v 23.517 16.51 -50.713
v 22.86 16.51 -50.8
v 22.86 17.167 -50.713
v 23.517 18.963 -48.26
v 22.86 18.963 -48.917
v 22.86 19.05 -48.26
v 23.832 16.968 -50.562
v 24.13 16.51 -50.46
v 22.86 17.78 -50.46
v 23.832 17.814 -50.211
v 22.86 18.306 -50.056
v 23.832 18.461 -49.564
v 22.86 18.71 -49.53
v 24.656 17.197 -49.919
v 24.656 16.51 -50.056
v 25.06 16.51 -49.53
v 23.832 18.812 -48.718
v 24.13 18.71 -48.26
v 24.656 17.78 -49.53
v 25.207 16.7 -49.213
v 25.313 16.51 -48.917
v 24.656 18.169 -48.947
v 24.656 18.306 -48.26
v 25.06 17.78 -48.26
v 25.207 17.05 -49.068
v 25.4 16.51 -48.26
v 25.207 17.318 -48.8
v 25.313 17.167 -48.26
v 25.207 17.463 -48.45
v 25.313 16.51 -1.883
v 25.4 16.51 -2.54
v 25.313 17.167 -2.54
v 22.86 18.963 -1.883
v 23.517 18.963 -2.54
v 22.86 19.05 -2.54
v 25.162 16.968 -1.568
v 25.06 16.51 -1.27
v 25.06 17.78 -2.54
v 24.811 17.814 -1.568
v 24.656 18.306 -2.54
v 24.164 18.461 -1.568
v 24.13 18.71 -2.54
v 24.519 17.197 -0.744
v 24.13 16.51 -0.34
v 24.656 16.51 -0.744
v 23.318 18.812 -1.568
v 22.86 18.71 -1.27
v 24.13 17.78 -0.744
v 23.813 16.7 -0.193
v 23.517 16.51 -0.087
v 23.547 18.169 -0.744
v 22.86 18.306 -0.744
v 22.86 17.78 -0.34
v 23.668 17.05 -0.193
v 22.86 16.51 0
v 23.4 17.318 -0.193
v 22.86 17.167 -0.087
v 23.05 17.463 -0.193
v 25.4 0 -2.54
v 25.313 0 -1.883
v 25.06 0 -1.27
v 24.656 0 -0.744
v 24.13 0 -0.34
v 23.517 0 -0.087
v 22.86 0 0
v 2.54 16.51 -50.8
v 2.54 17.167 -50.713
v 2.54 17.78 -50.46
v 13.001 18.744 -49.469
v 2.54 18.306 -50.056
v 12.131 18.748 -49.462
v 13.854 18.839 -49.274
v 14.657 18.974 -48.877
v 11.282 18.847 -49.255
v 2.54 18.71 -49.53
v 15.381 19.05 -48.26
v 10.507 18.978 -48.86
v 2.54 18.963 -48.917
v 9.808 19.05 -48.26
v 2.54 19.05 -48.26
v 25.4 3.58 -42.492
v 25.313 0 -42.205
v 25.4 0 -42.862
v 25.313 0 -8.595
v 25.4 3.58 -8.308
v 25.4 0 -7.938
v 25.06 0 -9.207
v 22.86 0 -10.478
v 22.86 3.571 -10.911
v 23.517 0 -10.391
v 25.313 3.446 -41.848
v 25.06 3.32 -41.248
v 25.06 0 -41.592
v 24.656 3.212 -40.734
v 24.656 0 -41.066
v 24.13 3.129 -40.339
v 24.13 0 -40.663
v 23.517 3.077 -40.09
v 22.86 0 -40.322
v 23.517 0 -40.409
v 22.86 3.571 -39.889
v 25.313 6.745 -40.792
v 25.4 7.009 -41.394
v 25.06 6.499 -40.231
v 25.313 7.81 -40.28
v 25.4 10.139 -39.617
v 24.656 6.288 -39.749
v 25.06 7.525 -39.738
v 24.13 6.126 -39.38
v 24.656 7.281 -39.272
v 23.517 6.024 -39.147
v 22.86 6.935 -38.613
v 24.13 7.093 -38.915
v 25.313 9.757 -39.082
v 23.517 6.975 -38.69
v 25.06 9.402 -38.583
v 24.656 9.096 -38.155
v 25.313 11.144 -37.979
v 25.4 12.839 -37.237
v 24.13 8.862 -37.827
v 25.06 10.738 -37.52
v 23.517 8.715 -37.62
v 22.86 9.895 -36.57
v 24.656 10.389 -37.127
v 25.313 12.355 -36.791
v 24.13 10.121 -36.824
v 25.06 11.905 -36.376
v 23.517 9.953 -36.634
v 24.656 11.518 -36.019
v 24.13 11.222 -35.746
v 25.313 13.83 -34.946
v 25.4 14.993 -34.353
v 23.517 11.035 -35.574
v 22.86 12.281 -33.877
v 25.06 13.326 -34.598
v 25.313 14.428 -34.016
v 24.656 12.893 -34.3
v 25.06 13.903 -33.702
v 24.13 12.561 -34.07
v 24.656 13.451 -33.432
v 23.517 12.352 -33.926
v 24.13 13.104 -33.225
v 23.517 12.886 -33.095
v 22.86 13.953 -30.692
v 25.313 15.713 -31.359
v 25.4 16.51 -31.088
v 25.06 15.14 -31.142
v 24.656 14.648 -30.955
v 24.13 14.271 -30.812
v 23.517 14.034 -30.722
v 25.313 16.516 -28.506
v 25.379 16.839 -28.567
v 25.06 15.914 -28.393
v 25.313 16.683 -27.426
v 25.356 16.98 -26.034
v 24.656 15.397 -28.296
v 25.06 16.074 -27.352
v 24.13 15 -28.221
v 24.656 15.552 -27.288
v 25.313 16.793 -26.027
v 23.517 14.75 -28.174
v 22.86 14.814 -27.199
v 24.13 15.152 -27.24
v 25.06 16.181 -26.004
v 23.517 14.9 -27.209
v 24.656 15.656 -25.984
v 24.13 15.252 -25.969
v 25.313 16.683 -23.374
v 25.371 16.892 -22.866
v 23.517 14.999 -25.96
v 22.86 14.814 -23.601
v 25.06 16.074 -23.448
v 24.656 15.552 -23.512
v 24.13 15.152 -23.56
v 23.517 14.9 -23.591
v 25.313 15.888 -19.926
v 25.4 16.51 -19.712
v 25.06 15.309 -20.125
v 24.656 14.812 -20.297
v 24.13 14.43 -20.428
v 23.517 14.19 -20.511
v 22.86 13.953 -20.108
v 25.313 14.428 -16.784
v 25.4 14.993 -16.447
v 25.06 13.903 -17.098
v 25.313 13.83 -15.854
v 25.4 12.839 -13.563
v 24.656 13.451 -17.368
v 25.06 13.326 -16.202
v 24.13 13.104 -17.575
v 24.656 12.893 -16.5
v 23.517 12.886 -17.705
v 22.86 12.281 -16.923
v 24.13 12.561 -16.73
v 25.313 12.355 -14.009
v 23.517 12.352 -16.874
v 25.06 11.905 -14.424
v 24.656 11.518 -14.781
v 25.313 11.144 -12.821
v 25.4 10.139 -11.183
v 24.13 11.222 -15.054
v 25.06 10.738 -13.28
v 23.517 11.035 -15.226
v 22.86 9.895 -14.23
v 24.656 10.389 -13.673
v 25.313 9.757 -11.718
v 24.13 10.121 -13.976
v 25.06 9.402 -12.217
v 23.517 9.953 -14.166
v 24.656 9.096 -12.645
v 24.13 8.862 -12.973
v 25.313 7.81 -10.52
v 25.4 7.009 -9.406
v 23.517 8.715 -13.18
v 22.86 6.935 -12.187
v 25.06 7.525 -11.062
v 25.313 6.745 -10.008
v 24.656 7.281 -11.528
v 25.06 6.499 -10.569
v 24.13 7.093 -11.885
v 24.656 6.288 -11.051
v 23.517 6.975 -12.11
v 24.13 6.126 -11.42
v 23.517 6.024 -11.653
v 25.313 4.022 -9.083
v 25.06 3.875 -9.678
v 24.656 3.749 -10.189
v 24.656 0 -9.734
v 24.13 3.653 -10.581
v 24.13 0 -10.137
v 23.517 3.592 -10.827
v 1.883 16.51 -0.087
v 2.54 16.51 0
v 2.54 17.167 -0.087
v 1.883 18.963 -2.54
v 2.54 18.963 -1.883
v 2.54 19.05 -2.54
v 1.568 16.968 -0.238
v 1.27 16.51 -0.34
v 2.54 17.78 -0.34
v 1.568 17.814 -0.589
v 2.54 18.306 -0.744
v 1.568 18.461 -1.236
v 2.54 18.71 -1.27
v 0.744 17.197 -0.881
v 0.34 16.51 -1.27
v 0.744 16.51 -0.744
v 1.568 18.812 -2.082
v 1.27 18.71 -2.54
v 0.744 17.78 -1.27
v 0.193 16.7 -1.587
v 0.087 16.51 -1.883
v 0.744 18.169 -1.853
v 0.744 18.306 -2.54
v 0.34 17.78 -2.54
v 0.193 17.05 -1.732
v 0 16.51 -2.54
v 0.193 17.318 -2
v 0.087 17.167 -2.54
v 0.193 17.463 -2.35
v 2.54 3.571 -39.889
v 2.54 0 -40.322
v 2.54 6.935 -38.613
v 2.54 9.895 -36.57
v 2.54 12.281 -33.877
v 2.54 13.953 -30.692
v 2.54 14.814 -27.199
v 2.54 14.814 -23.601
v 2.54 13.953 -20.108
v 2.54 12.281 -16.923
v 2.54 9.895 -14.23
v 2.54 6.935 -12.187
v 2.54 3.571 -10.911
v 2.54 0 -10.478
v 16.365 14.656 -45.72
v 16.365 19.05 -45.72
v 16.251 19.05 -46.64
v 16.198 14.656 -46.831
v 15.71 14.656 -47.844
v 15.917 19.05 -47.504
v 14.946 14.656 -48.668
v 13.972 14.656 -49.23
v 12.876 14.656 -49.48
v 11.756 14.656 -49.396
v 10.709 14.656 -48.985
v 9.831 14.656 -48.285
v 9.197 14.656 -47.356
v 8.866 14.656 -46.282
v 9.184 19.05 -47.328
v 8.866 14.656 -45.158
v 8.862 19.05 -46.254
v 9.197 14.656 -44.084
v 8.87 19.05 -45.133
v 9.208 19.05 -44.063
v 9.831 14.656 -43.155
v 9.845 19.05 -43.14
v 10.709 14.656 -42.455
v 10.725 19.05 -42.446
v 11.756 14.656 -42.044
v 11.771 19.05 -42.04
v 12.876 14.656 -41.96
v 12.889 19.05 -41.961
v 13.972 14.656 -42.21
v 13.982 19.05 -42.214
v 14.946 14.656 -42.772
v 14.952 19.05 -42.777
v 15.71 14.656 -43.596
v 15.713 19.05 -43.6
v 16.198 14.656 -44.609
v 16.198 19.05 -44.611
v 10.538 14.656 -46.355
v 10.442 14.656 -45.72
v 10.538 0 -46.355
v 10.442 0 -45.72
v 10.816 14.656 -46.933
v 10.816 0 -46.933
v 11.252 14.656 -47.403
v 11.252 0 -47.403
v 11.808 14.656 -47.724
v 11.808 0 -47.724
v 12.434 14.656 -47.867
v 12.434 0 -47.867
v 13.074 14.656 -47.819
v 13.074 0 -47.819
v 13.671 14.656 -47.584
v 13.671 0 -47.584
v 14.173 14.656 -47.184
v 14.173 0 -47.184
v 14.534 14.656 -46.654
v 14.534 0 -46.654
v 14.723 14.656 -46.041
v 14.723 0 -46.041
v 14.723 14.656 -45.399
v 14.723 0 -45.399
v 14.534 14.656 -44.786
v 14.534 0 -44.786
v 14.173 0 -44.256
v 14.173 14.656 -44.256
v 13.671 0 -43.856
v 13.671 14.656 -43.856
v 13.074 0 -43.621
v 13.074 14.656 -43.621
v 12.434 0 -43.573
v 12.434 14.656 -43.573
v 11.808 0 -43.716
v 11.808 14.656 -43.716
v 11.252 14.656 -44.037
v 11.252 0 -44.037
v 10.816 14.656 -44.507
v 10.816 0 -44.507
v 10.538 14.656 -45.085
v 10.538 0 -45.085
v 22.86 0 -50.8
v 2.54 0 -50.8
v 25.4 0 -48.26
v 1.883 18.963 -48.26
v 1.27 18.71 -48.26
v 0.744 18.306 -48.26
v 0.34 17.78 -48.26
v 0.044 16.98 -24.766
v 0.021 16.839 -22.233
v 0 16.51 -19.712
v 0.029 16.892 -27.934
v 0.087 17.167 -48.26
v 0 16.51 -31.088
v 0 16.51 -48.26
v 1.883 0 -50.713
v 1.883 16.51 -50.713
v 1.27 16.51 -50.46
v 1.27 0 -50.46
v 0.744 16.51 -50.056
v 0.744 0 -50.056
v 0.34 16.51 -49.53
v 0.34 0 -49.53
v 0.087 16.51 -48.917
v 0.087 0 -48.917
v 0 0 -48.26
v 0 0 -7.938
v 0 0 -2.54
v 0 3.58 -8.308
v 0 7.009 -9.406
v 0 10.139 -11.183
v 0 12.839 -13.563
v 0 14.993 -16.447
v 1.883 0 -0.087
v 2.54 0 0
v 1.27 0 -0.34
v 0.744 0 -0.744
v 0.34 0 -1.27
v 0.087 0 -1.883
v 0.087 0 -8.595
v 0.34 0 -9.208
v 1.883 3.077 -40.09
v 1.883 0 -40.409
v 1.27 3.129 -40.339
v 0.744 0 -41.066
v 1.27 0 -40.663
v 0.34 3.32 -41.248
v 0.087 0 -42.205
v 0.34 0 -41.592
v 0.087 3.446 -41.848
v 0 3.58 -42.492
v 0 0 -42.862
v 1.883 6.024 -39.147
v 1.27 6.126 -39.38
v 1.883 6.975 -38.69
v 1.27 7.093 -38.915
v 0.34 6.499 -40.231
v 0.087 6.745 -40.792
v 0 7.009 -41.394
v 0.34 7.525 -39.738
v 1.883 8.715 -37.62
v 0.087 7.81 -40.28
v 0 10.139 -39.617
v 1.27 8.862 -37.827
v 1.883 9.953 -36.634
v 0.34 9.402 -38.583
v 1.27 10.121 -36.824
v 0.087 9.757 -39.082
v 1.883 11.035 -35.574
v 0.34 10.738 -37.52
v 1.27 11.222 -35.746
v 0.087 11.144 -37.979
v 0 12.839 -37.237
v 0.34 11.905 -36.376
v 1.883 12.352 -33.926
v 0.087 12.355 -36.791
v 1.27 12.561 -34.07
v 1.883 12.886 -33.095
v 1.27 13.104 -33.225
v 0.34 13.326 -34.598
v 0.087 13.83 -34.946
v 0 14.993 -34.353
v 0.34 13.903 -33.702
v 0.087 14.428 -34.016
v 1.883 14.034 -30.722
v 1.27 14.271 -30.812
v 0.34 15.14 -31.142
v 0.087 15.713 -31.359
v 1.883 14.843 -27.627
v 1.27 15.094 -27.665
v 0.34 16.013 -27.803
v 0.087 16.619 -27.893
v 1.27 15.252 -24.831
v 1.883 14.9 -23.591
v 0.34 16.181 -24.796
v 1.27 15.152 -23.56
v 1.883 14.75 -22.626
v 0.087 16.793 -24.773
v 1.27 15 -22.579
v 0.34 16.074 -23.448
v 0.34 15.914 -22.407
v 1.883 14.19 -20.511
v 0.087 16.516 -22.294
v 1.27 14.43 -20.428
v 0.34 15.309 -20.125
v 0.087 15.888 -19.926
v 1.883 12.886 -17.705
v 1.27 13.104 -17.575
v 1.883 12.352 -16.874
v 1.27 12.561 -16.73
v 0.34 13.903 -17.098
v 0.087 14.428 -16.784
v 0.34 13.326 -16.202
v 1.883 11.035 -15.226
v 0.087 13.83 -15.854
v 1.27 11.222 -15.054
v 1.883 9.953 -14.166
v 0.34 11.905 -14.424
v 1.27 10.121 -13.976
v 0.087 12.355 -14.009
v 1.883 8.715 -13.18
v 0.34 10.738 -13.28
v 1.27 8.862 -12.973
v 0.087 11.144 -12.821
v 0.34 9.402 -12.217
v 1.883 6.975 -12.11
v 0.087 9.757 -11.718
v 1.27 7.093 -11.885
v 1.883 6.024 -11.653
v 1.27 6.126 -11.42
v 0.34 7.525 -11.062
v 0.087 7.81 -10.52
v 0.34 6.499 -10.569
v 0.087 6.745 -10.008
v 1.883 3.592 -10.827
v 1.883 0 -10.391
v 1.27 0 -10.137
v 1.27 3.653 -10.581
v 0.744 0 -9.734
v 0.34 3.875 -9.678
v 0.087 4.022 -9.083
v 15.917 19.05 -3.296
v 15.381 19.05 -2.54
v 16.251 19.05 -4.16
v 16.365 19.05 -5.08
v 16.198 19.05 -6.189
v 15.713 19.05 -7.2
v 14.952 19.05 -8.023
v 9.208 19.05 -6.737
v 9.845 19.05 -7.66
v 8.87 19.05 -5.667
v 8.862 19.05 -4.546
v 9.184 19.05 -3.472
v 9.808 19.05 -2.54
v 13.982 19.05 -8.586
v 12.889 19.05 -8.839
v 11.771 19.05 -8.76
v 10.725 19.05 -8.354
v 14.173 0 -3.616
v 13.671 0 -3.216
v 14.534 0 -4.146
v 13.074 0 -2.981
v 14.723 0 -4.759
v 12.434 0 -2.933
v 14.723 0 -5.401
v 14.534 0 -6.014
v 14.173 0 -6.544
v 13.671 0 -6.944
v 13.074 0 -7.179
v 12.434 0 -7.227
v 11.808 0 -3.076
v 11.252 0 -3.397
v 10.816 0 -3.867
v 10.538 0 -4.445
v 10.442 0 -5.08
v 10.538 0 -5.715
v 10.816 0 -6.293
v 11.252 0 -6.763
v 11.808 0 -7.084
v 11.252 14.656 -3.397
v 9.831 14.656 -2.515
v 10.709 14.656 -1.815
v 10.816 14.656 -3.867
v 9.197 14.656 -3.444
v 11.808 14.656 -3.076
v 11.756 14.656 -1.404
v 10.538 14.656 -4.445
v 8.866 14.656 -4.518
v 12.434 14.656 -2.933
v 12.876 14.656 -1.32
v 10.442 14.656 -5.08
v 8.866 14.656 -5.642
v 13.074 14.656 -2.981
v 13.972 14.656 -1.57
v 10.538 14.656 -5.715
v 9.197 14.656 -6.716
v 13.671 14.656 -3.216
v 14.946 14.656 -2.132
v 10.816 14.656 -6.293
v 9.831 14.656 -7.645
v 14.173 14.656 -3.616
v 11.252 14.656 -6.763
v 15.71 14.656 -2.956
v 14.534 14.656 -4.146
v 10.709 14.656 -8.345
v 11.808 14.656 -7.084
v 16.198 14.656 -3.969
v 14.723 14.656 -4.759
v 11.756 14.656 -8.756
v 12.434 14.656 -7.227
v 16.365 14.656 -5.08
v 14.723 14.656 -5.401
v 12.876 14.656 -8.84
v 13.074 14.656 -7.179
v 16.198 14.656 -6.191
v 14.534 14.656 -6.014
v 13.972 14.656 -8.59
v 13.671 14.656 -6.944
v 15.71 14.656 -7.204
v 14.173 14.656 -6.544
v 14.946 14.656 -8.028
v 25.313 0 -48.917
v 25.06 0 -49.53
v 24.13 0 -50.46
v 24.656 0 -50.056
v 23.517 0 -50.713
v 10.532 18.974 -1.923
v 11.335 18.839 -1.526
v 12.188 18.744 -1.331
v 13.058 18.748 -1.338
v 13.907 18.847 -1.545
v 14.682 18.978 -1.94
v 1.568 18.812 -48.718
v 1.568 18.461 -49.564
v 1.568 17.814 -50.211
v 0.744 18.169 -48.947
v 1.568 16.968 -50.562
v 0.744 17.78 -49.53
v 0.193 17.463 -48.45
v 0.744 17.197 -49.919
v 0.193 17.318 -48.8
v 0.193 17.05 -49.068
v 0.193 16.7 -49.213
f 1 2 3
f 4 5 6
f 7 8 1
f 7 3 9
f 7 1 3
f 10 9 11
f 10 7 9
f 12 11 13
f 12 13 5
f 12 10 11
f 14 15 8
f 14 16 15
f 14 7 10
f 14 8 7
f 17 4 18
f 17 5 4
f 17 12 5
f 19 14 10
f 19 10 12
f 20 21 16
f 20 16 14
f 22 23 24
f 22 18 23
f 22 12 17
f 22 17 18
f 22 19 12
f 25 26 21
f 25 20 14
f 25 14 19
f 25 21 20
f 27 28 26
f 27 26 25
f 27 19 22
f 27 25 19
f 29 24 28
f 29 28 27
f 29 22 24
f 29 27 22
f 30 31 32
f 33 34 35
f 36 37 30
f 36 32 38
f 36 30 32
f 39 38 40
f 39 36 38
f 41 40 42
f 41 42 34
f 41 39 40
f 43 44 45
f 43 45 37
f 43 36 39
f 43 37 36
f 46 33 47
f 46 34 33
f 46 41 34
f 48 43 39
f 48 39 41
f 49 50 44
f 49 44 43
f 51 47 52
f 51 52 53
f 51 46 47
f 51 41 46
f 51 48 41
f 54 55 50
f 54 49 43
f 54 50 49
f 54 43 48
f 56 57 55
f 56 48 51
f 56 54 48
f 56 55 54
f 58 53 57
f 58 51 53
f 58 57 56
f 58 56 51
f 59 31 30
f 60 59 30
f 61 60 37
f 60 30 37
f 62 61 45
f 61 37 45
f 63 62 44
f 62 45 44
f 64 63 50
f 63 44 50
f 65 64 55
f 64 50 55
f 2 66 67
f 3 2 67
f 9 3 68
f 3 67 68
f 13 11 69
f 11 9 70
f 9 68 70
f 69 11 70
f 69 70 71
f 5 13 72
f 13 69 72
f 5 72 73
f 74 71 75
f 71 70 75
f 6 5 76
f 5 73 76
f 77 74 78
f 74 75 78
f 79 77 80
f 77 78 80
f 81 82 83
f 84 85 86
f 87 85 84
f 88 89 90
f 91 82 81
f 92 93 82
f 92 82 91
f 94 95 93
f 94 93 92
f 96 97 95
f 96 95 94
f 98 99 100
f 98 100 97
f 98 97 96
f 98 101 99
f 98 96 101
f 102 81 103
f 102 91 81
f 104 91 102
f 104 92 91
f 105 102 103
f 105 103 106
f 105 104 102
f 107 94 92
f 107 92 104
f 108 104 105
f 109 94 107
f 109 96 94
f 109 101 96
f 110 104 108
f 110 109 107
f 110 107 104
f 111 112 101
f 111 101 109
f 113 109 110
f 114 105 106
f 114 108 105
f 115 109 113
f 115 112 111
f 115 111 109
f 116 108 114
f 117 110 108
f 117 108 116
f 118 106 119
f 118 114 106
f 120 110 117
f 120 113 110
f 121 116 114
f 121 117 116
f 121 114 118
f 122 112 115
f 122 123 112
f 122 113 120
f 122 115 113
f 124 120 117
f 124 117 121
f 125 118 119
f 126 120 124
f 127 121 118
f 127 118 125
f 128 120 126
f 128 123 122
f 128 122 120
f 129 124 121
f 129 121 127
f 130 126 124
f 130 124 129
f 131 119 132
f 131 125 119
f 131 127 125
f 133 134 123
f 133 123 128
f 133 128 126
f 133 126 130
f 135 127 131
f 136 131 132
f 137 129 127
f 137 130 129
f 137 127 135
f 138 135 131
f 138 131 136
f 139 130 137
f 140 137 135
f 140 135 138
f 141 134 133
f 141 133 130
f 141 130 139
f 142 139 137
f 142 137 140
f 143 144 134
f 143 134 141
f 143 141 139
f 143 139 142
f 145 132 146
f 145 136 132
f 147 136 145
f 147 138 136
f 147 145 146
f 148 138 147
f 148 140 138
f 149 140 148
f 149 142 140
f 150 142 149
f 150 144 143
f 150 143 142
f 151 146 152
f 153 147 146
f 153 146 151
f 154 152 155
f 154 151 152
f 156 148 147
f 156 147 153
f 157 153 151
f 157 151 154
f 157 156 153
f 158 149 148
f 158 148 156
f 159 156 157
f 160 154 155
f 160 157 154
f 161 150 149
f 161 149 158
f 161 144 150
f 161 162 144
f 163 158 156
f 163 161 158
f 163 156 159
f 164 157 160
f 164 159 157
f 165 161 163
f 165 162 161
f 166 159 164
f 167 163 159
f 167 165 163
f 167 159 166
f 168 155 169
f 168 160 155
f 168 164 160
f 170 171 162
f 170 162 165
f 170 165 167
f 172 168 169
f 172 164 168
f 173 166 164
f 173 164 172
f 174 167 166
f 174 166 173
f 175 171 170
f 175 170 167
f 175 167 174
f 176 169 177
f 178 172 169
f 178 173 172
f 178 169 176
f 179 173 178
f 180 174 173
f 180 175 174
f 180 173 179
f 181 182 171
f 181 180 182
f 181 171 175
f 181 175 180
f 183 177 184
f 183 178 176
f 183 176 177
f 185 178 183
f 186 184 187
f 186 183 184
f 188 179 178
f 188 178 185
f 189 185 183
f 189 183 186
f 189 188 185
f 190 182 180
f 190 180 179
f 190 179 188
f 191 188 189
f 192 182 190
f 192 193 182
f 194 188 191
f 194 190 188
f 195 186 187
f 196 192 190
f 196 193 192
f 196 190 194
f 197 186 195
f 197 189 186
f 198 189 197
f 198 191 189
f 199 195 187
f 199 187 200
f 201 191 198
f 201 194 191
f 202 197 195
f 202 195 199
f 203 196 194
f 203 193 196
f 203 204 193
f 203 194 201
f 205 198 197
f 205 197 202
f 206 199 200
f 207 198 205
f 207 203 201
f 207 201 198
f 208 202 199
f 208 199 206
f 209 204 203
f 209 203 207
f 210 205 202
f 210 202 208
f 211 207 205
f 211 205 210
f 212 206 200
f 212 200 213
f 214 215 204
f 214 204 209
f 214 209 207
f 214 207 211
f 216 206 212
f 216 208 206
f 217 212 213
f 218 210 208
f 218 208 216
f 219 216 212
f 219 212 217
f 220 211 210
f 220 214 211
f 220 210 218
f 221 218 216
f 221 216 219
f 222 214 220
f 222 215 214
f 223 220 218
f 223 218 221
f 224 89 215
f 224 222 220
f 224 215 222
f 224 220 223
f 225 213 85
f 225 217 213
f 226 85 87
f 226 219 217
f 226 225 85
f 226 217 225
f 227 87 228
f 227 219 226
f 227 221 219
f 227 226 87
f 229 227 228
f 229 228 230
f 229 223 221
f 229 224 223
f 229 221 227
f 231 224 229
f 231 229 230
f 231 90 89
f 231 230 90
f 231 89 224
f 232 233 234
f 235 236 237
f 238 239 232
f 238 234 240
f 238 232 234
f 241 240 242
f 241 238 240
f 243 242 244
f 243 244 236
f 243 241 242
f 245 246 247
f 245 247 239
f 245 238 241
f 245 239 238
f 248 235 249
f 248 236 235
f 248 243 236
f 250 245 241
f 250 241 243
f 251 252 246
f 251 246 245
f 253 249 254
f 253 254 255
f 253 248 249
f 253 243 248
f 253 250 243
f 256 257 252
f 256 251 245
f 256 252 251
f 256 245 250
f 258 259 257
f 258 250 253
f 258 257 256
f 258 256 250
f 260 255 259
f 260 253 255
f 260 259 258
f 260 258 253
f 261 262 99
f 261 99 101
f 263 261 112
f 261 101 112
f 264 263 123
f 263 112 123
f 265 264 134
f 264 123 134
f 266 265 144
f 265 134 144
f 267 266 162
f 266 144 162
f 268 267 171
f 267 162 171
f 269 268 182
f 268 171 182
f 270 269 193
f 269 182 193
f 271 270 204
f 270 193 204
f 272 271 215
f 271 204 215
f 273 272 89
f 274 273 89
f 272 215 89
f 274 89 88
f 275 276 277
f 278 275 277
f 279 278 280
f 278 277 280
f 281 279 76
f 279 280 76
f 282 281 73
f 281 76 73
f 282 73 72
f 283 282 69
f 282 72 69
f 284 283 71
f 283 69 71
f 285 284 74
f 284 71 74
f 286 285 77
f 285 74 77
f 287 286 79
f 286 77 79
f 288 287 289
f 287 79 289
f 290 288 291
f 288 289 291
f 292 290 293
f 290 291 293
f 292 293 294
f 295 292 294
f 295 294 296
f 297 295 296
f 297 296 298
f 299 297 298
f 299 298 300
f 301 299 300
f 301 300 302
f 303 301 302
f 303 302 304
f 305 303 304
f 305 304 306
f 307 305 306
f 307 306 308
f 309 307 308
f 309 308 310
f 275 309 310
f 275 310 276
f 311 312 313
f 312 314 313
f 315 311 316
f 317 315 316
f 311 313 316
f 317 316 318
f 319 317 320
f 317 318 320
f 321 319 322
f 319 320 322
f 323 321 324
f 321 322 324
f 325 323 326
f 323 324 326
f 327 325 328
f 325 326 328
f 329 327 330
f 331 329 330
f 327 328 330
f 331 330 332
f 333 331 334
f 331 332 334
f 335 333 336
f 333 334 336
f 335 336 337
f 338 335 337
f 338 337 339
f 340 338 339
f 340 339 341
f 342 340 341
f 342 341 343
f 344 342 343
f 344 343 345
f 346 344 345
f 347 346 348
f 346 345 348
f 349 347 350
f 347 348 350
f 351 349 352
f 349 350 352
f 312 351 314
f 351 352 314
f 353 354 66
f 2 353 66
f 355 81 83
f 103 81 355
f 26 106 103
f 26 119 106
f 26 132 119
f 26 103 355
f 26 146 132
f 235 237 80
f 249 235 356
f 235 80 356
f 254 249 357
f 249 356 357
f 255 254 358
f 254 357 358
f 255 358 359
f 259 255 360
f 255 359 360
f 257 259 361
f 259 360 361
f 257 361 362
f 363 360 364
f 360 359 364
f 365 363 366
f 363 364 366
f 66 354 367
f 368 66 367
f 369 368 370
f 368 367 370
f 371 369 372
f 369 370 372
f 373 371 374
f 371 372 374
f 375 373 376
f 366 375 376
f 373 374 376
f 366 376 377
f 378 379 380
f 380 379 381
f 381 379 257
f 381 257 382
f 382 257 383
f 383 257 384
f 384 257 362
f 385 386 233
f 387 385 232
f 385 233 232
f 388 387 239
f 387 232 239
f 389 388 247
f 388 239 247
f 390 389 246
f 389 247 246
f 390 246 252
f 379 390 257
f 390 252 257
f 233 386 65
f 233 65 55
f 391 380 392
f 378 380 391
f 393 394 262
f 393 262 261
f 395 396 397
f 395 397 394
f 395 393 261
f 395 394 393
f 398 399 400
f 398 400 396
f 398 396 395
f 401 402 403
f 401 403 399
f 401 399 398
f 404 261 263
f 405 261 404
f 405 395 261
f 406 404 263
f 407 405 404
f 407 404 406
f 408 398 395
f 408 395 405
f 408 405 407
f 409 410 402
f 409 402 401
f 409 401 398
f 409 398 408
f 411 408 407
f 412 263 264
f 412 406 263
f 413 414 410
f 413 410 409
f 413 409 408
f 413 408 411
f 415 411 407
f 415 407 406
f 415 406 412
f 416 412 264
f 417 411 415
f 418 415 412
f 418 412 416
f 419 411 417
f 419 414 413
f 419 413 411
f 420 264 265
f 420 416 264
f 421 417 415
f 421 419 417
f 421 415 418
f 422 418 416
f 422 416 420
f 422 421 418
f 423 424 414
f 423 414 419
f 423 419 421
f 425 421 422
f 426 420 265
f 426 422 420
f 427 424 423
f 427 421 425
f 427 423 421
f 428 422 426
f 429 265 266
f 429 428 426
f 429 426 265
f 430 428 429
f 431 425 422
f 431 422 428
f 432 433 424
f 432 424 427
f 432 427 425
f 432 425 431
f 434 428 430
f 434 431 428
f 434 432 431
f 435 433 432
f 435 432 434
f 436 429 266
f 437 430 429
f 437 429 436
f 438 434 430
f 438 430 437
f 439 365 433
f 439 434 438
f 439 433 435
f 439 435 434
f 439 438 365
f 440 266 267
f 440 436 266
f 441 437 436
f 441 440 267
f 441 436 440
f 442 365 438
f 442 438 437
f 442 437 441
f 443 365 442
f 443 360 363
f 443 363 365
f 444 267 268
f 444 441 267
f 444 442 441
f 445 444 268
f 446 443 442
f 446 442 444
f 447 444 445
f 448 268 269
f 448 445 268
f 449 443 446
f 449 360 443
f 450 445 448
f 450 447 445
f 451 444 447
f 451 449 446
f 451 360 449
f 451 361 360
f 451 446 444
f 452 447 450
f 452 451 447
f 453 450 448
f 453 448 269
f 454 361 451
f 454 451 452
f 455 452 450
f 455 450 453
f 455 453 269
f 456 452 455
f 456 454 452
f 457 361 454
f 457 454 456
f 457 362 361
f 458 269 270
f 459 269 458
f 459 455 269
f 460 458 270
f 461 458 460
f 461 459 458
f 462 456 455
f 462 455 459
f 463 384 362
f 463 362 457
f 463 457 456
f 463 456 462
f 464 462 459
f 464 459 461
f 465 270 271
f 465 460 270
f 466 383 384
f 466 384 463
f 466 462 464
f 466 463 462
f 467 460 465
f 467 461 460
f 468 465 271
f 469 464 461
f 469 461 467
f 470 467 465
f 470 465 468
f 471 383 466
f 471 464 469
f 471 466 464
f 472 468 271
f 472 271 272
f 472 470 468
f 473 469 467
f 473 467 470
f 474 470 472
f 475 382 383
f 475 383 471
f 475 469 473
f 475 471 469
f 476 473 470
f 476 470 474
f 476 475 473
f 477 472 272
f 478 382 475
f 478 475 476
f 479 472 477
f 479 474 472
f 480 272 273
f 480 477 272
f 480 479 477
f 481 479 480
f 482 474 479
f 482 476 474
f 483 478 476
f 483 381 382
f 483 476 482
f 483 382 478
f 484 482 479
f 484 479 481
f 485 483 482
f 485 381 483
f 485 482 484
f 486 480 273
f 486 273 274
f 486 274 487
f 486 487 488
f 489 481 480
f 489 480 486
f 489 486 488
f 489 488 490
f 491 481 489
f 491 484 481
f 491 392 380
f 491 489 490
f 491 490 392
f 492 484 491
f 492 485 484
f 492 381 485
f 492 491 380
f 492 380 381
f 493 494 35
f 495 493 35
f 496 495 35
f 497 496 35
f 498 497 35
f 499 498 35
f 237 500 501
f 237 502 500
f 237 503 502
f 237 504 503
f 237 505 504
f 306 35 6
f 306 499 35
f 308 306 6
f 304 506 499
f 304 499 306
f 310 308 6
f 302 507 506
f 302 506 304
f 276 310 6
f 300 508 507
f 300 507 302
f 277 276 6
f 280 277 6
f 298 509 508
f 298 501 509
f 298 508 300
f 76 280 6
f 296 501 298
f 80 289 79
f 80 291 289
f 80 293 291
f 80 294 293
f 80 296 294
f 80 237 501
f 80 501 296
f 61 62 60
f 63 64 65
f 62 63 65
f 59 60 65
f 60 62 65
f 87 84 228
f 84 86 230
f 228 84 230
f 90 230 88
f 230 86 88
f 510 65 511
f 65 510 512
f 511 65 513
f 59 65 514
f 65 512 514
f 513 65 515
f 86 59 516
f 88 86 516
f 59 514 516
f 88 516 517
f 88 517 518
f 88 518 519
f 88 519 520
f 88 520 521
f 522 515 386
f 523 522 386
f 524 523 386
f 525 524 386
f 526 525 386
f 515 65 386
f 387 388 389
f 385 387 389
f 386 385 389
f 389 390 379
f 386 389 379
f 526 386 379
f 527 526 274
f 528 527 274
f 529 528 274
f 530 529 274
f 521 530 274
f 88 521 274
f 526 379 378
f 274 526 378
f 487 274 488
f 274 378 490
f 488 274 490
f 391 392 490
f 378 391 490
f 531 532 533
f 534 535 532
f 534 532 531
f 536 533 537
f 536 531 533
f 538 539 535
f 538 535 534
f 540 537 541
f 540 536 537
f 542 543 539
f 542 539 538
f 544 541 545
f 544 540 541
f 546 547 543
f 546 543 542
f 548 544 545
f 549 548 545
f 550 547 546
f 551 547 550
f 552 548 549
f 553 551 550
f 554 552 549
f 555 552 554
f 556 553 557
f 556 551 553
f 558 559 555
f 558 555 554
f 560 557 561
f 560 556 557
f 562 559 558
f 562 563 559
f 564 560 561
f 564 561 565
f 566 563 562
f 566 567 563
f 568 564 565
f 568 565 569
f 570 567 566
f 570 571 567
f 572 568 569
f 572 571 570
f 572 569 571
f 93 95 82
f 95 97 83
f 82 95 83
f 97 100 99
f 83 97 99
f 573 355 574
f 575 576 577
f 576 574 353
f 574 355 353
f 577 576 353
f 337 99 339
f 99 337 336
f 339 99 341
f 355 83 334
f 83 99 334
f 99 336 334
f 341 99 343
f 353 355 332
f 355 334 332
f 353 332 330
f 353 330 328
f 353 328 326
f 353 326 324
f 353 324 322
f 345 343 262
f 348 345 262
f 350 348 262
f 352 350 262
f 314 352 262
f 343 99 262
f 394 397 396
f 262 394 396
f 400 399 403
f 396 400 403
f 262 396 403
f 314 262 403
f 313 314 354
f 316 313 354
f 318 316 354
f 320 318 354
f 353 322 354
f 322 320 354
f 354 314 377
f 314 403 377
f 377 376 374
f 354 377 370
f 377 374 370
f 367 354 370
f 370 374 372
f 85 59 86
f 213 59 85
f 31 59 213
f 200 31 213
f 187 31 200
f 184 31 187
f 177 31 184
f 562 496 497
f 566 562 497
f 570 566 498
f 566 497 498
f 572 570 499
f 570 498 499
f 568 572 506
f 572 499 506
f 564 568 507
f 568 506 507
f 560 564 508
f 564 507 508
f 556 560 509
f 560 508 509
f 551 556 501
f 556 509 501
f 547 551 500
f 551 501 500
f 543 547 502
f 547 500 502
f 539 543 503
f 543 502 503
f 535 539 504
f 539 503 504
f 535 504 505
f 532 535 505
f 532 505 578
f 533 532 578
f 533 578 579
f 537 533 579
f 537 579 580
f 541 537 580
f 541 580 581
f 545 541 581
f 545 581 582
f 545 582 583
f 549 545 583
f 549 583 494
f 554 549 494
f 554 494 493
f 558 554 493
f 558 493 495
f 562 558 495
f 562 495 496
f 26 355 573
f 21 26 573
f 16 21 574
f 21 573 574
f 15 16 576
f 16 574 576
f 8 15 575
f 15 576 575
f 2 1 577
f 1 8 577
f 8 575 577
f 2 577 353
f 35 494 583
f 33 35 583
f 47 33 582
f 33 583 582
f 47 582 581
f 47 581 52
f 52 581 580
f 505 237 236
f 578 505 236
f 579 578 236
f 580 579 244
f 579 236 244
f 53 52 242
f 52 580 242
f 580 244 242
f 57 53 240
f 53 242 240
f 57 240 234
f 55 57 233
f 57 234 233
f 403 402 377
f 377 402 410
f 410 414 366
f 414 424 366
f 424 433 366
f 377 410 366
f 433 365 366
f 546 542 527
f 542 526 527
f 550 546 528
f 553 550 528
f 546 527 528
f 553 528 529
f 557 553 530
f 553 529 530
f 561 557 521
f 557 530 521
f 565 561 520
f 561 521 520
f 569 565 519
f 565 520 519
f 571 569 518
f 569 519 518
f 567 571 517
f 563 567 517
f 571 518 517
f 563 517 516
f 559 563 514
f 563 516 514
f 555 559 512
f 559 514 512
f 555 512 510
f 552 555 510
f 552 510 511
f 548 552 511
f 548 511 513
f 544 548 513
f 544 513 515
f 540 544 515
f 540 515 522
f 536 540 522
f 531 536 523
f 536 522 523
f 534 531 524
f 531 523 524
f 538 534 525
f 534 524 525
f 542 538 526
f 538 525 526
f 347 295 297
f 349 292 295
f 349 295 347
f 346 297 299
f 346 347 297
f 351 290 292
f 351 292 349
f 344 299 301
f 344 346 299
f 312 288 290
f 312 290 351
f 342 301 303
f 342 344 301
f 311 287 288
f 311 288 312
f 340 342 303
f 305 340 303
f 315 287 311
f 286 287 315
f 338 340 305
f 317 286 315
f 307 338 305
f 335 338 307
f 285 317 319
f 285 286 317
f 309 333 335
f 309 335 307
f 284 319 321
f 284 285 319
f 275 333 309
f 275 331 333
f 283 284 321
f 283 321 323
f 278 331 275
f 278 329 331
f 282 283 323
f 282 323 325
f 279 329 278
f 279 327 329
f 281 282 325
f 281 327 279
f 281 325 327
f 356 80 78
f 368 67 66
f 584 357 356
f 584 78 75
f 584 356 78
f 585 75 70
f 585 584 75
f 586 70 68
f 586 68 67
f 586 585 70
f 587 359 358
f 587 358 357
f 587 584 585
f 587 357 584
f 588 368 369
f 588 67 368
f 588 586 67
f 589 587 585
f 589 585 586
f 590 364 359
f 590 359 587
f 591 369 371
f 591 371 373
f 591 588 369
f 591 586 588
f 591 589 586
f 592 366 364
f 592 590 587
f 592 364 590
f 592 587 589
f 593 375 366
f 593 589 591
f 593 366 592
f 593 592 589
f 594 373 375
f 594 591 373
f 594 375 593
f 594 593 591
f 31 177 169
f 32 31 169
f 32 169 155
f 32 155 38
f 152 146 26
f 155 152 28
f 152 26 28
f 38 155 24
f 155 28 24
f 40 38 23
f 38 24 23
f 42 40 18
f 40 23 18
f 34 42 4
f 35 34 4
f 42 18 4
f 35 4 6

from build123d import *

# Parameters (mm, degrees)
SKETCH1_W                                      = 50.8
SKETCH1_H                                      = 19.05
BOSS_EXTRUDE1_DEPTH                            = 25.4
SKETCH2_R                                      = 14.9225
CUT_EXTRUDE1_DEPTH                             = 60.905780189
CBORE_FOR_6_BUTTON_HEAD_CAP_SCREW1_D           = 4.3053
CBORE_FOR_6_BUTTON_HEAD_CAP_SCREW1_CBORE_D     = 7.54126
CBORE_FOR_6_BUTTON_HEAD_CAP_SCREW1_CBORE_DEPTH = 4.3942
FILLET1_R                                      = 2.54


with BuildPart() as part:
    # Sketch1 → Boss-Extrude1 (new body)
    with BuildSketch(Plane(origin=(0, 0, 0), x_dir=(0, 0, -1), z_dir=(1, 0, 0))):
        with Locations((25.4, 9.525)):
            Rectangle(SKETCH1_W, SKETCH1_H)
    extrude(amount=BOSS_EXTRUDE1_DEPTH)

    # Sketch2 → Cut-Extrude1 (cut, through all)
    with BuildSketch(Plane(origin=(25.4, 0, 0), x_dir=(0, 0, -1), z_dir=(1, 0, 0))):
        with Locations((25.4, 0)):
            Circle(SKETCH2_R)
    extrude(amount=-CUT_EXTRUDE1_DEPTH, mode=Mode.SUBTRACT)

    # CBORE for #6 Button Head Cap Screw1 (through all)
    with Locations(Plane(origin=(0, 19.05, 0), x_dir=(1, 0, 0), z_dir=(0, 1, 0))):
        with Locations((12.594620829, 5.08), (12.594620829, 45.72)):
            CounterBoreHole(CBORE_FOR_6_BUTTON_HEAD_CAP_SCREW1_D / 2, CBORE_FOR_6_BUTTON_HEAD_CAP_SCREW1_CBORE_D / 2, CBORE_FOR_6_BUTTON_HEAD_CAP_SCREW1_CBORE_DEPTH)

    # Fillet1
    # the kernel refuses this fillet: 2.54 mm, written as the material it takes off along each edge
    with BuildSketch(Plane(origin=(22.86, 16.51, -48.26), x_dir=(0, 1, 0), z_dir=(1, 0, 0))) as fillet1_piece_1_section:
        Polygon((0, 0), (FILLET1_R, 0), (FILLET1_R, -FILLET1_R), (0, -FILLET1_R), align=None)
    fillet1_piece_1 = extrude(amount=FILLET1_R, mode=Mode.PRIVATE)
    fillet1_piece_1 = fillet1_piece_1 - Plane(origin=(22.86, 16.51, -48.26), x_dir=(0, -0.7071067811865475, 0.7071067811865475), z_dir=(1, 0, 0)) * Sphere(FILLET1_R, mode=Mode.PRIVATE)
    add(fillet1_piece_1, mode=Mode.SUBTRACT)
    with BuildSketch(Plane(origin=(22.86, 16.51, -2.54), x_dir=(1, 0, 0), z_dir=(0, 0, 1))) as fillet1_piece_2_section:
        Polygon((0, 0), (FILLET1_R, 0), (FILLET1_R, FILLET1_R), (0, FILLET1_R), align=None)
    fillet1_piece_2 = extrude(amount=FILLET1_R, mode=Mode.PRIVATE)
    fillet1_piece_2 = fillet1_piece_2 - Plane(origin=(22.86, 16.51, -2.54), x_dir=(-0.7071067811865475, -0.7071067811865475, 0), z_dir=(0, 0, 1)) * Sphere(FILLET1_R, mode=Mode.PRIVATE)
    add(fillet1_piece_2, mode=Mode.SUBTRACT)
    with BuildSketch(Plane(origin=(2.54, 16.51, -48.26), x_dir=(0, 1, 0), z_dir=(-1, 0, 0))) as fillet1_piece_3_section:
        Polygon((0, 0), (FILLET1_R, 0), (FILLET1_R, FILLET1_R), (0, FILLET1_R), align=None)
    fillet1_piece_3 = extrude(amount=FILLET1_R, mode=Mode.PRIVATE)
    fillet1_piece_3 = fillet1_piece_3 - Plane(origin=(2.54, 16.51, -48.26), x_dir=(0, -0.7071067811865475, 0.7071067811865475), z_dir=(-1, 0, 0)) * Sphere(FILLET1_R, mode=Mode.PRIVATE)
    add(fillet1_piece_3, mode=Mode.SUBTRACT)
    with BuildSketch(Plane(origin=(2.54, 16.51, -2.54), x_dir=(0, 0, 1), z_dir=(-1, 0, 0))) as fillet1_piece_4_section:
        Polygon((0, 0), (FILLET1_R, 0), (FILLET1_R, FILLET1_R), (0, FILLET1_R), align=None)
    fillet1_piece_4 = extrude(amount=FILLET1_R, mode=Mode.PRIVATE)
    fillet1_piece_4 = fillet1_piece_4 - Plane(origin=(2.54, 16.51, -2.54), x_dir=(0, -0.7071067811865475, -0.7071067811865475), z_dir=(-1, 0, 0)) * Sphere(FILLET1_R, mode=Mode.PRIVATE)
    add(fillet1_piece_4, mode=Mode.SUBTRACT)
    with BuildSketch(Plane(origin=(25.4, -6.35, -50.8), x_dir=(0, 0, 1), z_dir=(0, 1, 0))) as fillet1_piece_5:
        with BuildLine():
            CenterArc((FILLET1_R, -FILLET1_R), FILLET1_R, 90, 90)
            Line((0, -FILLET1_R), (0, 0))
            Line((0, 0), (FILLET1_R, 0))
        make_face()
    extrude(amount=22.86, mode=Mode.SUBTRACT)
    with BuildSketch(Plane(origin=(25.4, 19.05, -48.26), x_dir=(0, -1, 0), z_dir=(0, 0, 1))) as fillet1_piece_6:
        with BuildLine():
            CenterArc((FILLET1_R, -FILLET1_R), FILLET1_R, 90, 90)
            Line((0, -FILLET1_R), (0, 0))
            Line((0, 0), (FILLET1_R, 0))
        make_face()
    extrude(amount=45.72, mode=Mode.SUBTRACT)
    with BuildSketch(Plane(origin=(25.4, 0, -25.4), x_dir=(0, -0.413428527977308, -0.9105365738148667), z_dir=(0, -0.9105365738148667, 0.413428527977308))) as fillet1_piece_7:
        with BuildLine():
            CenterArc((14.9225 + FILLET1_R, -FILLET1_R), FILLET1_R, 90, 90)
            Line((14.9225 + FILLET1_R, 0), (14.9225, 0))
            Line((14.9225, 0), (14.9225, -FILLET1_R))
        make_face()
    revolve(axis=Axis((25.4, 0, -25.4), (1, 0, 0)), revolution_arc=228.840784647, mode=Mode.SUBTRACT)
    with BuildSketch(Plane(origin=(0, 0, -25.4), x_dir=(0, -0.413428527977308, -0.9105365738148667), z_dir=(0, -0.9105365738148667, 0.413428527977308))) as fillet1_piece_8:
        with BuildLine():
            CenterArc((14.9225 + FILLET1_R, FILLET1_R), FILLET1_R, 180, 90)
            Line((14.9225, FILLET1_R), (14.9225, 0))
            Line((14.9225, 0), (14.9225 + FILLET1_R, 0))
        make_face()
    revolve(axis=Axis((0, 0, -25.4), (1, 0, 0)), revolution_arc=228.840784647, mode=Mode.SUBTRACT)
    with BuildSketch(Plane(origin=(25.4, 16.51, 0), x_dir=(-1, 0, 0), z_dir=(0, -1, 0)), Plane(origin=(0, -6.35, -50.8), x_dir=(0, 0, 1), z_dir=(0, 1, 0)), Plane(origin=(0, 16.51, 0), x_dir=(0, 0, -1), z_dir=(0, -1, 0))) as fillet1_piece_9:
        with BuildLine():
            CenterArc((FILLET1_R, FILLET1_R), FILLET1_R, 180, 90)
            Line((0, FILLET1_R), (0, 0))
            Line((0, 0), (FILLET1_R, 0))
        make_face()
    extrude(amount=22.86, mode=Mode.SUBTRACT)
    with BuildSketch(Plane(origin=(0, 19.05, -48.26), x_dir=(0, -1, 0), z_dir=(0, 0, 1))) as fillet1_piece_10:
        with BuildLine():
            CenterArc((FILLET1_R, FILLET1_R), FILLET1_R, 180, 90)
            Line((0, FILLET1_R), (0, 0))
            Line((0, 0), (FILLET1_R, 0))
        make_face()
    extrude(amount=45.72, mode=Mode.SUBTRACT)
    with BuildSketch(Plane(origin=(2.54, 19.05, 0), x_dir=(0, -1, 0), z_dir=(1, 0, 0)), Plane(origin=(2.54, 19.05, -50.8), x_dir=(0, 0, 1), z_dir=(1, 0, 0))) as fillet1_piece_11:
        with BuildLine():
            CenterArc((FILLET1_R, FILLET1_R), FILLET1_R, 180, 90)
            Line((0, FILLET1_R), (0, 0))
            Line((0, 0), (FILLET1_R, 0))
        make_face()
    extrude(amount=20.32, mode=Mode.SUBTRACT)


solid = part.part
